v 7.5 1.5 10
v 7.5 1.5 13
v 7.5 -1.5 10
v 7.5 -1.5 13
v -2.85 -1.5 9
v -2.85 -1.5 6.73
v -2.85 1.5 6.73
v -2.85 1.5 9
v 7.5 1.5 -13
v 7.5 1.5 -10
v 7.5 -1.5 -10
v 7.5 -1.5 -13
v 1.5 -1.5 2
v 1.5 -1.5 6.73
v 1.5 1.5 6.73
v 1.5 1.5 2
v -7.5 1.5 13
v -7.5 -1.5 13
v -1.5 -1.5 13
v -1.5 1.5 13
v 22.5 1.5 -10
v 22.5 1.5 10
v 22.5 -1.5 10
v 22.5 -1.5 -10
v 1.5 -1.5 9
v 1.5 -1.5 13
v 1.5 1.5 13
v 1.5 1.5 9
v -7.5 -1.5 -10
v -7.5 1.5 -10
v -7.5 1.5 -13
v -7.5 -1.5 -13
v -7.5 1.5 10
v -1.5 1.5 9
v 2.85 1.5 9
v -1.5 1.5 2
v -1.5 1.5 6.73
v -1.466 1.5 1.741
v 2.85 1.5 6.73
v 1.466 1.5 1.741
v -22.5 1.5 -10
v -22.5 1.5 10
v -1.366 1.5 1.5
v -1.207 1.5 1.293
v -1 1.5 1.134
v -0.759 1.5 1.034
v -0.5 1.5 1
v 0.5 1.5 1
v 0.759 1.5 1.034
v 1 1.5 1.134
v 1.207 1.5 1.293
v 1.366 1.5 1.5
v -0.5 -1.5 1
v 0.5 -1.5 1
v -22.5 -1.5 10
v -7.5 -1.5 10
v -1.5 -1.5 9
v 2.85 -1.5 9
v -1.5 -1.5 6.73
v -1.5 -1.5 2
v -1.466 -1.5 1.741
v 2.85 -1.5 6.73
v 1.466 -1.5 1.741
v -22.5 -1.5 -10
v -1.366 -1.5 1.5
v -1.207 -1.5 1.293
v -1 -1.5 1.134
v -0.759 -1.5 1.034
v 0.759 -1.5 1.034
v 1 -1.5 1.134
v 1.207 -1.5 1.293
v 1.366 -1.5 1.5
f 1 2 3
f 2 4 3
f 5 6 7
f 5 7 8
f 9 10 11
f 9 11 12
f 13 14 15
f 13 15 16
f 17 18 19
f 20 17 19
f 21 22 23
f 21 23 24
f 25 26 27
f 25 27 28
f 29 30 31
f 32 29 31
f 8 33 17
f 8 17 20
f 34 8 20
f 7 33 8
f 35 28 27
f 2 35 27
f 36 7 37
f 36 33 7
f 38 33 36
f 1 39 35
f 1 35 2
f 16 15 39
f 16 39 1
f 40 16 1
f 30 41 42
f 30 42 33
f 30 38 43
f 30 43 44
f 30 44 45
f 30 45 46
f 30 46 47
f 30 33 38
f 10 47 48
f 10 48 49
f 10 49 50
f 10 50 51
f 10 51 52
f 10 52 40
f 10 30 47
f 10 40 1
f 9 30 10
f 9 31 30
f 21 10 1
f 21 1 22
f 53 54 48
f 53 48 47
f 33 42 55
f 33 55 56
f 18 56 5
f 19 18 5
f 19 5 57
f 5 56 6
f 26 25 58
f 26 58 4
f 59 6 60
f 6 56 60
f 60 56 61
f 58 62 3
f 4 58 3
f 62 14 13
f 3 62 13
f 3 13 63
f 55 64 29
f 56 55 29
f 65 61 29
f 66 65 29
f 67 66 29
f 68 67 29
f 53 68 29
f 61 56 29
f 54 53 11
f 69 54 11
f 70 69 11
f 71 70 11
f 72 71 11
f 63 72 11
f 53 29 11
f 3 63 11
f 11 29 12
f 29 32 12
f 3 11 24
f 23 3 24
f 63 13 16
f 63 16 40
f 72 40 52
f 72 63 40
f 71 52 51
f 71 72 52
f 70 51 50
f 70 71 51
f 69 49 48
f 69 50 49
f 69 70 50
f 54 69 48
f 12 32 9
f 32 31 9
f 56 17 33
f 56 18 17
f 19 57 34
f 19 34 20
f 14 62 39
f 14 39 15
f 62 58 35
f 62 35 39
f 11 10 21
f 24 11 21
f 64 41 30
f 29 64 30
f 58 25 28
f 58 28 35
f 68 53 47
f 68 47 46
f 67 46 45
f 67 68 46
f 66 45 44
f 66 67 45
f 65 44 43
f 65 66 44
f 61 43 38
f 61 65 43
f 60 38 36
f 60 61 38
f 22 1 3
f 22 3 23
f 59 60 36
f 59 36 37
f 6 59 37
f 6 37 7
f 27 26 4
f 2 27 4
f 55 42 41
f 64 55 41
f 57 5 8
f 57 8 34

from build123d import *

# Parameters (mm, degrees)
SKETCH1_W               = 45
SKETCH1_H               = 20
BOSS_EXTRUDE1_DEPTH     = 1.5
SKETCH2_W               = 15
SKETCH2_H               = 3
BOSS_EXTRUDE2_DEPTH     = 1.5
CUT_EXTRUDE1_DEPTH      = 27.02883017
CUT_EXTRUDE1_DEPTH_BACK = 27.02883017


with BuildPart() as part:
    # Sketch1 → Boss-Extrude1 (new, symmetric)
    with BuildSketch(Plane(origin=(0, 0, 0), x_dir=(1, 0, 0), z_dir=(0, 1, 0))):
        Rectangle(SKETCH1_W, SKETCH1_H)
    extrude(amount=BOSS_EXTRUDE1_DEPTH, both=True)

    # Sketch2 → Boss-Extrude2 (add, symmetric)
    with BuildSketch(Plane(origin=(0, 0, 0), x_dir=(1, 0, 0), z_dir=(0, 1, 0))):
        with Locations((0, -11.5)):
            Rectangle(SKETCH2_W, SKETCH2_H)
        with Locations((0, 11.5)):
            Rectangle(SKETCH2_W, SKETCH2_H)
    extrude(amount=BOSS_EXTRUDE2_DEPTH, both=True)

    # Sketch3 → Cut-Extrude1 (cut, two sides: drawn at the far end of the back side and taken through both)
    with BuildSketch(Plane(origin=(0, 0, 0), x_dir=(1, 0, 0), z_dir=(0, 1, 0)).offset(-CUT_EXTRUDE1_DEPTH_BACK)):
        with BuildLine():
            Line((-1.5, -13), (1.5, -13))
            Line((1.5, -13), (1.5, -9))
            Line((1.5, -9), (2.85, -9))
            Line((2.85, -9), (2.85, -6.73))
            Line((2.85, -6.73), (1.5, -6.73))
            Line((1.5, -6.73), (1.5, -2))
            ThreePointArc((1.5, -2), (1.207106781, -1.292893219), (0.5, -1))
            Line((0.5, -1), (-0.5, -1))
            ThreePointArc((-0.5, -1), (-1.207106781, -1.292893219), (-1.5, -2))
            Line((-1.5, -2), (-1.5, -6.73))
            Line((-1.5, -6.73), (-2.85, -6.73))
            Line((-2.85, -6.73), (-2.85, -9))
            Line((-2.85, -9), (-1.5, -9))
            Line((-1.5, -9), (-1.5, -13))
        make_face()
    extrude(amount=CUT_EXTRUDE1_DEPTH + CUT_EXTRUDE1_DEPTH_BACK, mode=Mode.SUBTRACT)


solid = part.part
